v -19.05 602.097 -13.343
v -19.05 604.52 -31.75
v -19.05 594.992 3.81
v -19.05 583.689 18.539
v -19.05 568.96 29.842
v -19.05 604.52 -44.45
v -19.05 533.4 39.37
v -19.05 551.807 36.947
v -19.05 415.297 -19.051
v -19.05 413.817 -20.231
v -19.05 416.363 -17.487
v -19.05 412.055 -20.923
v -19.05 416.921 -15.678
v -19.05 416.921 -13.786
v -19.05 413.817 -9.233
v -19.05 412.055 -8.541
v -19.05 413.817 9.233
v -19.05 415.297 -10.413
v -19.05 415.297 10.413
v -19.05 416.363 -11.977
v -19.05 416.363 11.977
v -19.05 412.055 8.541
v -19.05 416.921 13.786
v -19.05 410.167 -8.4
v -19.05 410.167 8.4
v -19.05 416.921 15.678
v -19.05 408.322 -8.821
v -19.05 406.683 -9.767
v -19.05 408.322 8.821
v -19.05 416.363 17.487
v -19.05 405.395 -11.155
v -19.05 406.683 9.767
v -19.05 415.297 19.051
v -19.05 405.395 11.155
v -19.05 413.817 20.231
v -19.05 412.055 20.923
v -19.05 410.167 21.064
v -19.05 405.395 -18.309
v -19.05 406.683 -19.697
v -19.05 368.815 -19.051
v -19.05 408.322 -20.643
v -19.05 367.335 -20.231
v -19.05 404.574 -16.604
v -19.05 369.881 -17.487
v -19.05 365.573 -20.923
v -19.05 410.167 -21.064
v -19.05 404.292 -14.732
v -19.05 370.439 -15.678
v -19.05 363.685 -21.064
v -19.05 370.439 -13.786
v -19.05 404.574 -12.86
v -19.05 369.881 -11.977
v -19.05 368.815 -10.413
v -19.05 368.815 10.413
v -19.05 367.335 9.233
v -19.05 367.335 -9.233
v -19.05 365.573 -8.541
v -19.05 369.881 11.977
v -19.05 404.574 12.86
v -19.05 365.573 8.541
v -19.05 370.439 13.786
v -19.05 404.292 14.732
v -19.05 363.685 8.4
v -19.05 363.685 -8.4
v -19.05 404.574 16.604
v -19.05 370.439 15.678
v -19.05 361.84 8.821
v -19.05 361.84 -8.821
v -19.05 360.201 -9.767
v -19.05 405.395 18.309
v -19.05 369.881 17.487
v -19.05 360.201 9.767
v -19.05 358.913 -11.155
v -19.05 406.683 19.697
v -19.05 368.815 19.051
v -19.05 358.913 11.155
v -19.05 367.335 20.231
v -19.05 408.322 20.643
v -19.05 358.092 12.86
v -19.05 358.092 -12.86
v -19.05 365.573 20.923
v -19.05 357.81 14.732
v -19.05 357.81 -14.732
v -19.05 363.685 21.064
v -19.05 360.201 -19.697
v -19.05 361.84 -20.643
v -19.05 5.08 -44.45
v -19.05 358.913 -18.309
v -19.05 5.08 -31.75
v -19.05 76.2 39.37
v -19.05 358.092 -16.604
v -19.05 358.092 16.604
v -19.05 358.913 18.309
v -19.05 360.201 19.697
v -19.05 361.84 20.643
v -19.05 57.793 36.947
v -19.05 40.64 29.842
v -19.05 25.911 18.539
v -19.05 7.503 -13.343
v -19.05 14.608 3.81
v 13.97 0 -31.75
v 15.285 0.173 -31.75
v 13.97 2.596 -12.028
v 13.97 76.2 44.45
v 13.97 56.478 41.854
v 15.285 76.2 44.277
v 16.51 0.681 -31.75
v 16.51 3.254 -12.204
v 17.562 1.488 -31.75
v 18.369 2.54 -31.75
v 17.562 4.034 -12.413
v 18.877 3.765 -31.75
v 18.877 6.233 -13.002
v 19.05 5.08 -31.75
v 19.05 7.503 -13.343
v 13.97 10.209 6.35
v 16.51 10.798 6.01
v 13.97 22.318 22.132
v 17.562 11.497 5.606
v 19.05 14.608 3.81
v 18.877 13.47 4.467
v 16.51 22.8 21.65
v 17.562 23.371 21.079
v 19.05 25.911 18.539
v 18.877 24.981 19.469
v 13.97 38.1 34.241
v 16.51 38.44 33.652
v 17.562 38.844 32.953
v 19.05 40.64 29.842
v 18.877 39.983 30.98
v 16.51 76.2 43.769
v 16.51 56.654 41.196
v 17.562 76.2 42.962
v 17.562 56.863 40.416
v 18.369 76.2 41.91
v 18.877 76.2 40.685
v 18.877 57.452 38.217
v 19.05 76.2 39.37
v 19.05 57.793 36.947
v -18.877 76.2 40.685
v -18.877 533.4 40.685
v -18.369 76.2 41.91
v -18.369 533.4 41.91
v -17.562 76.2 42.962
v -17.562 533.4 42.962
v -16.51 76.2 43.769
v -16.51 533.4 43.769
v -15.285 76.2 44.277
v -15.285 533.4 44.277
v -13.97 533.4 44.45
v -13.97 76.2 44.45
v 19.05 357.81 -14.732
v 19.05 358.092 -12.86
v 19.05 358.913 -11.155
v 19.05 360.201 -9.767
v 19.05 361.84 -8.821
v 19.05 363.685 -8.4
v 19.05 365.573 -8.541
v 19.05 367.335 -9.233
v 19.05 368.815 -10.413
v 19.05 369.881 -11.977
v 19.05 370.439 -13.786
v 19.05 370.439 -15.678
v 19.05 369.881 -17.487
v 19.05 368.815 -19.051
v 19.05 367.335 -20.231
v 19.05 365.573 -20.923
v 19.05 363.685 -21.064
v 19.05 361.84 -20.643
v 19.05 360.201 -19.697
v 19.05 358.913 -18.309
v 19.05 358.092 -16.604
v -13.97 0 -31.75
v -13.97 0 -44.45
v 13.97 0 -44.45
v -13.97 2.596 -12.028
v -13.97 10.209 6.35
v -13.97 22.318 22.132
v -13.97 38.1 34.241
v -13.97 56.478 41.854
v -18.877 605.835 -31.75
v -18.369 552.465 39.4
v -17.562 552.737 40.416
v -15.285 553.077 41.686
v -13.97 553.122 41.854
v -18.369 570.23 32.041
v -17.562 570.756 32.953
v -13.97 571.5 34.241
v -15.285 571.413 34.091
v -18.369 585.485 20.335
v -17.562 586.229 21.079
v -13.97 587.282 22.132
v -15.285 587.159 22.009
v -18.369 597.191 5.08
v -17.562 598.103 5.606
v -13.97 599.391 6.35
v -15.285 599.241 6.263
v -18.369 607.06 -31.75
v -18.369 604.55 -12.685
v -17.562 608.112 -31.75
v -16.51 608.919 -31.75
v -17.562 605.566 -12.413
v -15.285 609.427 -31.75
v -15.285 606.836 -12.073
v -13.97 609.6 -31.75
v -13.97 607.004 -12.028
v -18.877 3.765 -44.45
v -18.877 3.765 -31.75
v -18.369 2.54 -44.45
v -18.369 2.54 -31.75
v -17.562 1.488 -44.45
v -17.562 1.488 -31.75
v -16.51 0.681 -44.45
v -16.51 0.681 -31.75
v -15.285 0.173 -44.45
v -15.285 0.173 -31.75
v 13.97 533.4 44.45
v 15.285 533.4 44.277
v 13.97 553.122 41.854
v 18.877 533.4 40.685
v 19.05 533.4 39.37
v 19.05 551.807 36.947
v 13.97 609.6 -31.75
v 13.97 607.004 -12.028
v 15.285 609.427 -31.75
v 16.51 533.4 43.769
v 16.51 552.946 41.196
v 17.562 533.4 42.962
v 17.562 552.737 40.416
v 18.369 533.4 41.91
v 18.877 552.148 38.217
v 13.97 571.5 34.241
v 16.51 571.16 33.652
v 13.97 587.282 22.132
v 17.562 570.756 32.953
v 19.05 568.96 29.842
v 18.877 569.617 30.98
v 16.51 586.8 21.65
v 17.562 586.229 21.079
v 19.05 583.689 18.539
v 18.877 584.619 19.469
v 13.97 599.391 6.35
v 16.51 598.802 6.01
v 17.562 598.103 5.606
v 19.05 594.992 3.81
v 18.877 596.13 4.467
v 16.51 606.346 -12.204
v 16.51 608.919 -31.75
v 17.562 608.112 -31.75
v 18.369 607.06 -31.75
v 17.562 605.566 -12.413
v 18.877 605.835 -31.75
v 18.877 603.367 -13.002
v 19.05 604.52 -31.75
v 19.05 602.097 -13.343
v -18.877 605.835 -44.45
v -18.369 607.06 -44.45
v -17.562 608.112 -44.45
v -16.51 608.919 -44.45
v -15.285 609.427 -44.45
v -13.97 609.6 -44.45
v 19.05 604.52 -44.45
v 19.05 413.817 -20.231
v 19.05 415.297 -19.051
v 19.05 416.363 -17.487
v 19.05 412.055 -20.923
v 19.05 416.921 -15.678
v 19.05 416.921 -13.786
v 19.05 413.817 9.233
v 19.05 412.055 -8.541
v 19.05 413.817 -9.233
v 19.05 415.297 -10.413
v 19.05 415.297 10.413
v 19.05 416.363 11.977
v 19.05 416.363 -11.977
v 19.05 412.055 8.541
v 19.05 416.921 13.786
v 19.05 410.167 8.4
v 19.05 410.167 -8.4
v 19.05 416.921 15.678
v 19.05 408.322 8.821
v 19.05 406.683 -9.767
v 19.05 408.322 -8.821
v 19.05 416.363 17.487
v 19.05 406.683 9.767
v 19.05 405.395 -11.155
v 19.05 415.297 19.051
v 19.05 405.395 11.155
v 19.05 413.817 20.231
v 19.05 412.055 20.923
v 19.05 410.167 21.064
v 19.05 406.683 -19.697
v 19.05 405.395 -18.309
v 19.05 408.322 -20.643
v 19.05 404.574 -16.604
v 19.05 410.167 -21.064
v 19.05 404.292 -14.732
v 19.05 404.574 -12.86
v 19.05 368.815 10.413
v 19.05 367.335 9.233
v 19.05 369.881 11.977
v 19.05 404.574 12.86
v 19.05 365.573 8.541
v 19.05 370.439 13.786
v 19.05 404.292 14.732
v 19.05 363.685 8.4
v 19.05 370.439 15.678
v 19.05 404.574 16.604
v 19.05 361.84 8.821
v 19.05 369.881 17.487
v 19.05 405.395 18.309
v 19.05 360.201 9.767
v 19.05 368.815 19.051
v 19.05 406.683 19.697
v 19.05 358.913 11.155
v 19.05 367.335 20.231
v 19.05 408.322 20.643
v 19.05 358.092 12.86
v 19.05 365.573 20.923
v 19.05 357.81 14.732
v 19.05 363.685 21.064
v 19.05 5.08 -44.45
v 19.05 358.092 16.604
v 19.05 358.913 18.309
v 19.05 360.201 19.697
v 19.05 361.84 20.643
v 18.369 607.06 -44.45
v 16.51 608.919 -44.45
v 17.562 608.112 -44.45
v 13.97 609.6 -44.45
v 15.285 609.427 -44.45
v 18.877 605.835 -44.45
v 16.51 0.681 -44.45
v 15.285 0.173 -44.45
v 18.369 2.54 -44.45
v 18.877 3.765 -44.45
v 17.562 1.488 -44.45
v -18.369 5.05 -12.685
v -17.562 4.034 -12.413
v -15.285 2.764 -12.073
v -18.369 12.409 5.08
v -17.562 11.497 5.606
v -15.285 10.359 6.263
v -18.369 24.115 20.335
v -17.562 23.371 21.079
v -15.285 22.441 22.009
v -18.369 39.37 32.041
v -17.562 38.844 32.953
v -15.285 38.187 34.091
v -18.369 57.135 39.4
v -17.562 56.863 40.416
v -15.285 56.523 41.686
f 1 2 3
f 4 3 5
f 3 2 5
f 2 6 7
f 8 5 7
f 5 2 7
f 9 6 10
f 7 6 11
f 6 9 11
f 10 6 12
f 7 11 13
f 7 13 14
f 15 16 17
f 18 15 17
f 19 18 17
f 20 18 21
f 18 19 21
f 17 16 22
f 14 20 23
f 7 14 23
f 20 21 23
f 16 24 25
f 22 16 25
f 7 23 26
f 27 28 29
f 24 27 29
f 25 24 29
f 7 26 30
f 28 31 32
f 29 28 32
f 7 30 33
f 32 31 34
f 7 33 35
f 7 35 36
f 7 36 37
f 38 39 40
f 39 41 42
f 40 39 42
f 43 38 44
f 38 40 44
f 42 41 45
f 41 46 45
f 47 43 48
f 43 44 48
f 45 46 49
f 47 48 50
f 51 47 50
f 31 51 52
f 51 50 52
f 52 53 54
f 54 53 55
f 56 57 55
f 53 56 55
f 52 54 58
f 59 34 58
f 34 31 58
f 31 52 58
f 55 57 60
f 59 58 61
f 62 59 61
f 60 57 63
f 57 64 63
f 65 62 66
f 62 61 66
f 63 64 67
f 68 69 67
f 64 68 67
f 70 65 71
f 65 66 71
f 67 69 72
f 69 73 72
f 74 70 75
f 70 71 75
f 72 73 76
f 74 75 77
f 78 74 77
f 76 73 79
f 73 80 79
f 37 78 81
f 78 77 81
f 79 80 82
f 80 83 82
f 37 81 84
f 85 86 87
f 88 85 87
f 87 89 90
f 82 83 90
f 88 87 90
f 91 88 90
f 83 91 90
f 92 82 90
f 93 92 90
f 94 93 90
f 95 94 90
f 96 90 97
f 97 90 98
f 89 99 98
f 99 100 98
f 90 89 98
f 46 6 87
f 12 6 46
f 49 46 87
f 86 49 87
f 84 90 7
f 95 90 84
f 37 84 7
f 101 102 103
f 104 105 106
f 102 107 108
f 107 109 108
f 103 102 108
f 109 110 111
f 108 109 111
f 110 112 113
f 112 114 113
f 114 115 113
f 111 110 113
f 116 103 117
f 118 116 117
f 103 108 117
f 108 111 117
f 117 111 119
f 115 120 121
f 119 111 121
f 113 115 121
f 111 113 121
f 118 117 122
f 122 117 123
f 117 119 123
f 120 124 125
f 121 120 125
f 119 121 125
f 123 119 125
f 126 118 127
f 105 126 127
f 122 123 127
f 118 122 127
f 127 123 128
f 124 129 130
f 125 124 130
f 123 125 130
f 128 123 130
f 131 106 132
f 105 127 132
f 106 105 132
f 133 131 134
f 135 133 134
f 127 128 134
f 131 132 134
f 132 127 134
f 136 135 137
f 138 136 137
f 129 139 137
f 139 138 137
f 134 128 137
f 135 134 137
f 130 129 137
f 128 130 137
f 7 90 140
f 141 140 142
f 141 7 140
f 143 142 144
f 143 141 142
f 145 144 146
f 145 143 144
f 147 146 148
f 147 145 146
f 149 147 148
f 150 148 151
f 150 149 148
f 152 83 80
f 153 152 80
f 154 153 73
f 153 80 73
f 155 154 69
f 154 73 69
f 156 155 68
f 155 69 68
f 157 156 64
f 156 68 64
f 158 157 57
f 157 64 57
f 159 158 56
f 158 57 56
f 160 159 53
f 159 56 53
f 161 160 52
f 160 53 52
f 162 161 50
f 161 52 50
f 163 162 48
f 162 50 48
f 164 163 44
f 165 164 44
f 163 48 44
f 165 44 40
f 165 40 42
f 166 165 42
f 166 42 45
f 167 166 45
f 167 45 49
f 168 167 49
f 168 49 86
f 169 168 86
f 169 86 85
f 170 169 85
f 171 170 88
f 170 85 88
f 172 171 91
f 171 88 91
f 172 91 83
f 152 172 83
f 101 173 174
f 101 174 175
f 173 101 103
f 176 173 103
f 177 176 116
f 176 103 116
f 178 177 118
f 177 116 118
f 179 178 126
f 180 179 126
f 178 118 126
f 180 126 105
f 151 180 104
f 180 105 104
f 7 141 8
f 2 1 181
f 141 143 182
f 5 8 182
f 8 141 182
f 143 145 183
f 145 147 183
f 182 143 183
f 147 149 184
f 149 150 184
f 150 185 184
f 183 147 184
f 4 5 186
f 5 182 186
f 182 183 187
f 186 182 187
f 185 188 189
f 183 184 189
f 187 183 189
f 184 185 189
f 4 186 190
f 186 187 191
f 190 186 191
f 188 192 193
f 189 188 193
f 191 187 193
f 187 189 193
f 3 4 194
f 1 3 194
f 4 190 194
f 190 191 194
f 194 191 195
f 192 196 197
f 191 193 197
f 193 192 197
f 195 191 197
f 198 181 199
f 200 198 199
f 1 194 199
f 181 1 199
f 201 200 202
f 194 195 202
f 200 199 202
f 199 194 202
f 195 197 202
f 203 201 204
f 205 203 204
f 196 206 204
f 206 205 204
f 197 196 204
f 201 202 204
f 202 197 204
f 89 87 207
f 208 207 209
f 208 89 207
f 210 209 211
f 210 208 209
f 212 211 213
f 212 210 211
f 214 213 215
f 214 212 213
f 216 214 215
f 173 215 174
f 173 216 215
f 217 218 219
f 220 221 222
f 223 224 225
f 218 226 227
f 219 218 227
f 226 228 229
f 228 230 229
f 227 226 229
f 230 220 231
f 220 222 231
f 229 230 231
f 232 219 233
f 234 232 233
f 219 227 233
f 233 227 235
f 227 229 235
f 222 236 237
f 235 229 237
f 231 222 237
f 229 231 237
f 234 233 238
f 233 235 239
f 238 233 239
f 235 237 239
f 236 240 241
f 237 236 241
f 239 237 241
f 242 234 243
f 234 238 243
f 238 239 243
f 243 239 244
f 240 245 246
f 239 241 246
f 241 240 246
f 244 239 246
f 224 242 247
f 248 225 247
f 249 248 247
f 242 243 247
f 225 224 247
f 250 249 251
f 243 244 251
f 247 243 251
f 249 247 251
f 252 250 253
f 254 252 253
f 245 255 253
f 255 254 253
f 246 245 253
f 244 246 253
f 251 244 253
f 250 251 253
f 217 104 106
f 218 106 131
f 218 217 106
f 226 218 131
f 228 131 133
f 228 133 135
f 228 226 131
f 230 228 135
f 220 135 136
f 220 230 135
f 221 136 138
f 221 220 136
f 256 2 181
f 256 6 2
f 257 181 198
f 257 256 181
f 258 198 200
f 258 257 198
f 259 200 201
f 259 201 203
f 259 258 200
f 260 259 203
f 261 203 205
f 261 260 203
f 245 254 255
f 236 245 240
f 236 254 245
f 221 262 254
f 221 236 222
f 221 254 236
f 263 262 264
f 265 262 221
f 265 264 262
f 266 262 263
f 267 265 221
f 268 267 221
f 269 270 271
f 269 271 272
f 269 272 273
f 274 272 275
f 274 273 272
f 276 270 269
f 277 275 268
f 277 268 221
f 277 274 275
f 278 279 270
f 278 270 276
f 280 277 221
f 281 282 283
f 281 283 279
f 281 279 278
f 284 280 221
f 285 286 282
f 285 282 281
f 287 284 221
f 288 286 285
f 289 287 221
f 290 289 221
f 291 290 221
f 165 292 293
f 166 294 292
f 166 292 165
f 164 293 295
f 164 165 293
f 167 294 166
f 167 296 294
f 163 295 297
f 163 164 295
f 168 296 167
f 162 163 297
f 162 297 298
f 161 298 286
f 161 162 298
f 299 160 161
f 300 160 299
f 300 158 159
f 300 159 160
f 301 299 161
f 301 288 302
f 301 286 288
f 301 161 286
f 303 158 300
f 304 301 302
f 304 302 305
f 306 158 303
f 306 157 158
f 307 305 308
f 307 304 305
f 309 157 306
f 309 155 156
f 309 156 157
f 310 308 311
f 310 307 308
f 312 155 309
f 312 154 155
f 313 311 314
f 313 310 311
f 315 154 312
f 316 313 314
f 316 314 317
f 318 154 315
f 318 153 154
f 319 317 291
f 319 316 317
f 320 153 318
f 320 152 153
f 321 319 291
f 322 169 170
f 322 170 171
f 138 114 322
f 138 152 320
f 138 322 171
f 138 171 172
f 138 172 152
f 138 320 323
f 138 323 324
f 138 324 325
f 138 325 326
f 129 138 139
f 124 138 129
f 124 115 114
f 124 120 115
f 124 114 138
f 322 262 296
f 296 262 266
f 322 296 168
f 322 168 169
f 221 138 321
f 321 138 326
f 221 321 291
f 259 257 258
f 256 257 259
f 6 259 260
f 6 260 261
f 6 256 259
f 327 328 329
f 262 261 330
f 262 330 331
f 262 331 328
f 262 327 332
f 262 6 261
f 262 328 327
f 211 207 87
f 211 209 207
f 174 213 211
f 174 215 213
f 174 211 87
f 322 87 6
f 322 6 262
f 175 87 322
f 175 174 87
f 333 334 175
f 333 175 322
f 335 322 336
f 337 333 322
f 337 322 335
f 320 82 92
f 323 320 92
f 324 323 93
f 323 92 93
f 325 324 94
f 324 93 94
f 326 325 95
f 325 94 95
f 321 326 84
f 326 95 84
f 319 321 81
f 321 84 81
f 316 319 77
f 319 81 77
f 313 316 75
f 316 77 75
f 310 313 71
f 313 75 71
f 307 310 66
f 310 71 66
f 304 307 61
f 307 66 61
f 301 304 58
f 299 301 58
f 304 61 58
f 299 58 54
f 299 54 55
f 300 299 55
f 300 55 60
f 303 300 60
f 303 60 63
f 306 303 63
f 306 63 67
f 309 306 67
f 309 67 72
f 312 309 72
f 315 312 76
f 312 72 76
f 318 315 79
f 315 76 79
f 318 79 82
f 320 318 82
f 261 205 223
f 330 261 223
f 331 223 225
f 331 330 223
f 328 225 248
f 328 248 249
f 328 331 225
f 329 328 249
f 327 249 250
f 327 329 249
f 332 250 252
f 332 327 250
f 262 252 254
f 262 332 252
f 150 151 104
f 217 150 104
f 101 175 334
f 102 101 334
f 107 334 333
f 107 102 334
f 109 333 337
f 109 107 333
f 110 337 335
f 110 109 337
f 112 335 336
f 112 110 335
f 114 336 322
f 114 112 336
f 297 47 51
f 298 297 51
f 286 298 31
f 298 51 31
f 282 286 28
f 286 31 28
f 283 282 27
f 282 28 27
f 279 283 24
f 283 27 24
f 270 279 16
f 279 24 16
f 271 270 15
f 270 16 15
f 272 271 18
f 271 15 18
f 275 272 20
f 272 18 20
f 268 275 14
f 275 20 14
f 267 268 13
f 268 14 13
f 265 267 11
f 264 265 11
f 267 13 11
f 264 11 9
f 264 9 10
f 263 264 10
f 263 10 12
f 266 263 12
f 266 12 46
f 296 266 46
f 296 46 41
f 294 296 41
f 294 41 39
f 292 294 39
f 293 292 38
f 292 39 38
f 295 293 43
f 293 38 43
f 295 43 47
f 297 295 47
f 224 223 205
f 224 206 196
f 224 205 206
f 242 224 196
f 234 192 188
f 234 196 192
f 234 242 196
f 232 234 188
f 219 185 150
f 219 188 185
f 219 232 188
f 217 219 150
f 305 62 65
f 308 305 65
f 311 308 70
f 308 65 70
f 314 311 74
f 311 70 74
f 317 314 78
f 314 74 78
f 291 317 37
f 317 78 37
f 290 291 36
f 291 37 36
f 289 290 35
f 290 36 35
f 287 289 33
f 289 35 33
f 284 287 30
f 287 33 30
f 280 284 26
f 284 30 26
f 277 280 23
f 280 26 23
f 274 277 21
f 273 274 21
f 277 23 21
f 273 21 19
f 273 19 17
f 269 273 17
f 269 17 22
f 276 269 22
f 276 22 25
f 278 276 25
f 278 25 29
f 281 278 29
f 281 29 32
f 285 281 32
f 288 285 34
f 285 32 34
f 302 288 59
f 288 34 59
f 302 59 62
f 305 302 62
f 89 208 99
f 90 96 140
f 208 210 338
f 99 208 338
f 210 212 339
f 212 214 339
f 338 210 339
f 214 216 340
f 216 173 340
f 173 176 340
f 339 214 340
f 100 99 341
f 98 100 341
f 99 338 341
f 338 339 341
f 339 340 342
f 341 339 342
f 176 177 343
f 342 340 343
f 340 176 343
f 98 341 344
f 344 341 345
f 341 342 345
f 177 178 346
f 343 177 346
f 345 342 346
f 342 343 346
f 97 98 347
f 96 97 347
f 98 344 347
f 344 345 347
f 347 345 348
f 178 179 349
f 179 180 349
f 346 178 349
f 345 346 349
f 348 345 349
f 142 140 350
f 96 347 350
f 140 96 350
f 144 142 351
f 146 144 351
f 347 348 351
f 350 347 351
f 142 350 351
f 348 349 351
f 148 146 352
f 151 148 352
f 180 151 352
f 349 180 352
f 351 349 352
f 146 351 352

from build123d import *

# Parameters (mm, degrees)
F0_W     = 38.1
F0_H     = 88.9
F1_DEPTH = 609.6
F2_R     = 6.35
F3_DEPTH = 38.1
F4_R     = 76.2
F5_R     = 5.08


with BuildPart() as f1:
    # F0 (on Front) → F1 (new body)
    with BuildSketch(Plane.XZ):
        Rectangle(F0_W, F0_H)
    extrude(amount=-F1_DEPTH)

    # F2 (on face) → F3 (cut)
    with BuildSketch(Plane(origin=(-19.05, 0, 0), x_dir=(0, -1, 0), z_dir=(-1, 0, 0))):
        with Locations((-410.6418, 14.732)):
            Circle(F2_R)
        with Locations((-410.6418, -14.732)):
            Circle(F2_R)
        with Locations((-364.1598, 14.732)):
            Circle(F2_R)
        with Locations((-364.1598, -14.732)):
            Circle(F2_R)
    extrude(amount=-F3_DEPTH, mode=Mode.SUBTRACT)

    # F4
    f4_edges = [f1.edges().sort_by_distance(p)[0] for p in [
        (0, 609.6, 44.45),
        (0, 0, 44.45),
    ]]
    fillet(f4_edges, radius=F4_R)

    # F5
    f5_edges = [f1.edges().sort_by_distance(p)[0] for p in [
        (-19.05, 304.8, 44.45),
        (19.05, 304.8, 44.45),
    ]]
    fillet(f5_edges, radius=F5_R)


solid = f1.part
